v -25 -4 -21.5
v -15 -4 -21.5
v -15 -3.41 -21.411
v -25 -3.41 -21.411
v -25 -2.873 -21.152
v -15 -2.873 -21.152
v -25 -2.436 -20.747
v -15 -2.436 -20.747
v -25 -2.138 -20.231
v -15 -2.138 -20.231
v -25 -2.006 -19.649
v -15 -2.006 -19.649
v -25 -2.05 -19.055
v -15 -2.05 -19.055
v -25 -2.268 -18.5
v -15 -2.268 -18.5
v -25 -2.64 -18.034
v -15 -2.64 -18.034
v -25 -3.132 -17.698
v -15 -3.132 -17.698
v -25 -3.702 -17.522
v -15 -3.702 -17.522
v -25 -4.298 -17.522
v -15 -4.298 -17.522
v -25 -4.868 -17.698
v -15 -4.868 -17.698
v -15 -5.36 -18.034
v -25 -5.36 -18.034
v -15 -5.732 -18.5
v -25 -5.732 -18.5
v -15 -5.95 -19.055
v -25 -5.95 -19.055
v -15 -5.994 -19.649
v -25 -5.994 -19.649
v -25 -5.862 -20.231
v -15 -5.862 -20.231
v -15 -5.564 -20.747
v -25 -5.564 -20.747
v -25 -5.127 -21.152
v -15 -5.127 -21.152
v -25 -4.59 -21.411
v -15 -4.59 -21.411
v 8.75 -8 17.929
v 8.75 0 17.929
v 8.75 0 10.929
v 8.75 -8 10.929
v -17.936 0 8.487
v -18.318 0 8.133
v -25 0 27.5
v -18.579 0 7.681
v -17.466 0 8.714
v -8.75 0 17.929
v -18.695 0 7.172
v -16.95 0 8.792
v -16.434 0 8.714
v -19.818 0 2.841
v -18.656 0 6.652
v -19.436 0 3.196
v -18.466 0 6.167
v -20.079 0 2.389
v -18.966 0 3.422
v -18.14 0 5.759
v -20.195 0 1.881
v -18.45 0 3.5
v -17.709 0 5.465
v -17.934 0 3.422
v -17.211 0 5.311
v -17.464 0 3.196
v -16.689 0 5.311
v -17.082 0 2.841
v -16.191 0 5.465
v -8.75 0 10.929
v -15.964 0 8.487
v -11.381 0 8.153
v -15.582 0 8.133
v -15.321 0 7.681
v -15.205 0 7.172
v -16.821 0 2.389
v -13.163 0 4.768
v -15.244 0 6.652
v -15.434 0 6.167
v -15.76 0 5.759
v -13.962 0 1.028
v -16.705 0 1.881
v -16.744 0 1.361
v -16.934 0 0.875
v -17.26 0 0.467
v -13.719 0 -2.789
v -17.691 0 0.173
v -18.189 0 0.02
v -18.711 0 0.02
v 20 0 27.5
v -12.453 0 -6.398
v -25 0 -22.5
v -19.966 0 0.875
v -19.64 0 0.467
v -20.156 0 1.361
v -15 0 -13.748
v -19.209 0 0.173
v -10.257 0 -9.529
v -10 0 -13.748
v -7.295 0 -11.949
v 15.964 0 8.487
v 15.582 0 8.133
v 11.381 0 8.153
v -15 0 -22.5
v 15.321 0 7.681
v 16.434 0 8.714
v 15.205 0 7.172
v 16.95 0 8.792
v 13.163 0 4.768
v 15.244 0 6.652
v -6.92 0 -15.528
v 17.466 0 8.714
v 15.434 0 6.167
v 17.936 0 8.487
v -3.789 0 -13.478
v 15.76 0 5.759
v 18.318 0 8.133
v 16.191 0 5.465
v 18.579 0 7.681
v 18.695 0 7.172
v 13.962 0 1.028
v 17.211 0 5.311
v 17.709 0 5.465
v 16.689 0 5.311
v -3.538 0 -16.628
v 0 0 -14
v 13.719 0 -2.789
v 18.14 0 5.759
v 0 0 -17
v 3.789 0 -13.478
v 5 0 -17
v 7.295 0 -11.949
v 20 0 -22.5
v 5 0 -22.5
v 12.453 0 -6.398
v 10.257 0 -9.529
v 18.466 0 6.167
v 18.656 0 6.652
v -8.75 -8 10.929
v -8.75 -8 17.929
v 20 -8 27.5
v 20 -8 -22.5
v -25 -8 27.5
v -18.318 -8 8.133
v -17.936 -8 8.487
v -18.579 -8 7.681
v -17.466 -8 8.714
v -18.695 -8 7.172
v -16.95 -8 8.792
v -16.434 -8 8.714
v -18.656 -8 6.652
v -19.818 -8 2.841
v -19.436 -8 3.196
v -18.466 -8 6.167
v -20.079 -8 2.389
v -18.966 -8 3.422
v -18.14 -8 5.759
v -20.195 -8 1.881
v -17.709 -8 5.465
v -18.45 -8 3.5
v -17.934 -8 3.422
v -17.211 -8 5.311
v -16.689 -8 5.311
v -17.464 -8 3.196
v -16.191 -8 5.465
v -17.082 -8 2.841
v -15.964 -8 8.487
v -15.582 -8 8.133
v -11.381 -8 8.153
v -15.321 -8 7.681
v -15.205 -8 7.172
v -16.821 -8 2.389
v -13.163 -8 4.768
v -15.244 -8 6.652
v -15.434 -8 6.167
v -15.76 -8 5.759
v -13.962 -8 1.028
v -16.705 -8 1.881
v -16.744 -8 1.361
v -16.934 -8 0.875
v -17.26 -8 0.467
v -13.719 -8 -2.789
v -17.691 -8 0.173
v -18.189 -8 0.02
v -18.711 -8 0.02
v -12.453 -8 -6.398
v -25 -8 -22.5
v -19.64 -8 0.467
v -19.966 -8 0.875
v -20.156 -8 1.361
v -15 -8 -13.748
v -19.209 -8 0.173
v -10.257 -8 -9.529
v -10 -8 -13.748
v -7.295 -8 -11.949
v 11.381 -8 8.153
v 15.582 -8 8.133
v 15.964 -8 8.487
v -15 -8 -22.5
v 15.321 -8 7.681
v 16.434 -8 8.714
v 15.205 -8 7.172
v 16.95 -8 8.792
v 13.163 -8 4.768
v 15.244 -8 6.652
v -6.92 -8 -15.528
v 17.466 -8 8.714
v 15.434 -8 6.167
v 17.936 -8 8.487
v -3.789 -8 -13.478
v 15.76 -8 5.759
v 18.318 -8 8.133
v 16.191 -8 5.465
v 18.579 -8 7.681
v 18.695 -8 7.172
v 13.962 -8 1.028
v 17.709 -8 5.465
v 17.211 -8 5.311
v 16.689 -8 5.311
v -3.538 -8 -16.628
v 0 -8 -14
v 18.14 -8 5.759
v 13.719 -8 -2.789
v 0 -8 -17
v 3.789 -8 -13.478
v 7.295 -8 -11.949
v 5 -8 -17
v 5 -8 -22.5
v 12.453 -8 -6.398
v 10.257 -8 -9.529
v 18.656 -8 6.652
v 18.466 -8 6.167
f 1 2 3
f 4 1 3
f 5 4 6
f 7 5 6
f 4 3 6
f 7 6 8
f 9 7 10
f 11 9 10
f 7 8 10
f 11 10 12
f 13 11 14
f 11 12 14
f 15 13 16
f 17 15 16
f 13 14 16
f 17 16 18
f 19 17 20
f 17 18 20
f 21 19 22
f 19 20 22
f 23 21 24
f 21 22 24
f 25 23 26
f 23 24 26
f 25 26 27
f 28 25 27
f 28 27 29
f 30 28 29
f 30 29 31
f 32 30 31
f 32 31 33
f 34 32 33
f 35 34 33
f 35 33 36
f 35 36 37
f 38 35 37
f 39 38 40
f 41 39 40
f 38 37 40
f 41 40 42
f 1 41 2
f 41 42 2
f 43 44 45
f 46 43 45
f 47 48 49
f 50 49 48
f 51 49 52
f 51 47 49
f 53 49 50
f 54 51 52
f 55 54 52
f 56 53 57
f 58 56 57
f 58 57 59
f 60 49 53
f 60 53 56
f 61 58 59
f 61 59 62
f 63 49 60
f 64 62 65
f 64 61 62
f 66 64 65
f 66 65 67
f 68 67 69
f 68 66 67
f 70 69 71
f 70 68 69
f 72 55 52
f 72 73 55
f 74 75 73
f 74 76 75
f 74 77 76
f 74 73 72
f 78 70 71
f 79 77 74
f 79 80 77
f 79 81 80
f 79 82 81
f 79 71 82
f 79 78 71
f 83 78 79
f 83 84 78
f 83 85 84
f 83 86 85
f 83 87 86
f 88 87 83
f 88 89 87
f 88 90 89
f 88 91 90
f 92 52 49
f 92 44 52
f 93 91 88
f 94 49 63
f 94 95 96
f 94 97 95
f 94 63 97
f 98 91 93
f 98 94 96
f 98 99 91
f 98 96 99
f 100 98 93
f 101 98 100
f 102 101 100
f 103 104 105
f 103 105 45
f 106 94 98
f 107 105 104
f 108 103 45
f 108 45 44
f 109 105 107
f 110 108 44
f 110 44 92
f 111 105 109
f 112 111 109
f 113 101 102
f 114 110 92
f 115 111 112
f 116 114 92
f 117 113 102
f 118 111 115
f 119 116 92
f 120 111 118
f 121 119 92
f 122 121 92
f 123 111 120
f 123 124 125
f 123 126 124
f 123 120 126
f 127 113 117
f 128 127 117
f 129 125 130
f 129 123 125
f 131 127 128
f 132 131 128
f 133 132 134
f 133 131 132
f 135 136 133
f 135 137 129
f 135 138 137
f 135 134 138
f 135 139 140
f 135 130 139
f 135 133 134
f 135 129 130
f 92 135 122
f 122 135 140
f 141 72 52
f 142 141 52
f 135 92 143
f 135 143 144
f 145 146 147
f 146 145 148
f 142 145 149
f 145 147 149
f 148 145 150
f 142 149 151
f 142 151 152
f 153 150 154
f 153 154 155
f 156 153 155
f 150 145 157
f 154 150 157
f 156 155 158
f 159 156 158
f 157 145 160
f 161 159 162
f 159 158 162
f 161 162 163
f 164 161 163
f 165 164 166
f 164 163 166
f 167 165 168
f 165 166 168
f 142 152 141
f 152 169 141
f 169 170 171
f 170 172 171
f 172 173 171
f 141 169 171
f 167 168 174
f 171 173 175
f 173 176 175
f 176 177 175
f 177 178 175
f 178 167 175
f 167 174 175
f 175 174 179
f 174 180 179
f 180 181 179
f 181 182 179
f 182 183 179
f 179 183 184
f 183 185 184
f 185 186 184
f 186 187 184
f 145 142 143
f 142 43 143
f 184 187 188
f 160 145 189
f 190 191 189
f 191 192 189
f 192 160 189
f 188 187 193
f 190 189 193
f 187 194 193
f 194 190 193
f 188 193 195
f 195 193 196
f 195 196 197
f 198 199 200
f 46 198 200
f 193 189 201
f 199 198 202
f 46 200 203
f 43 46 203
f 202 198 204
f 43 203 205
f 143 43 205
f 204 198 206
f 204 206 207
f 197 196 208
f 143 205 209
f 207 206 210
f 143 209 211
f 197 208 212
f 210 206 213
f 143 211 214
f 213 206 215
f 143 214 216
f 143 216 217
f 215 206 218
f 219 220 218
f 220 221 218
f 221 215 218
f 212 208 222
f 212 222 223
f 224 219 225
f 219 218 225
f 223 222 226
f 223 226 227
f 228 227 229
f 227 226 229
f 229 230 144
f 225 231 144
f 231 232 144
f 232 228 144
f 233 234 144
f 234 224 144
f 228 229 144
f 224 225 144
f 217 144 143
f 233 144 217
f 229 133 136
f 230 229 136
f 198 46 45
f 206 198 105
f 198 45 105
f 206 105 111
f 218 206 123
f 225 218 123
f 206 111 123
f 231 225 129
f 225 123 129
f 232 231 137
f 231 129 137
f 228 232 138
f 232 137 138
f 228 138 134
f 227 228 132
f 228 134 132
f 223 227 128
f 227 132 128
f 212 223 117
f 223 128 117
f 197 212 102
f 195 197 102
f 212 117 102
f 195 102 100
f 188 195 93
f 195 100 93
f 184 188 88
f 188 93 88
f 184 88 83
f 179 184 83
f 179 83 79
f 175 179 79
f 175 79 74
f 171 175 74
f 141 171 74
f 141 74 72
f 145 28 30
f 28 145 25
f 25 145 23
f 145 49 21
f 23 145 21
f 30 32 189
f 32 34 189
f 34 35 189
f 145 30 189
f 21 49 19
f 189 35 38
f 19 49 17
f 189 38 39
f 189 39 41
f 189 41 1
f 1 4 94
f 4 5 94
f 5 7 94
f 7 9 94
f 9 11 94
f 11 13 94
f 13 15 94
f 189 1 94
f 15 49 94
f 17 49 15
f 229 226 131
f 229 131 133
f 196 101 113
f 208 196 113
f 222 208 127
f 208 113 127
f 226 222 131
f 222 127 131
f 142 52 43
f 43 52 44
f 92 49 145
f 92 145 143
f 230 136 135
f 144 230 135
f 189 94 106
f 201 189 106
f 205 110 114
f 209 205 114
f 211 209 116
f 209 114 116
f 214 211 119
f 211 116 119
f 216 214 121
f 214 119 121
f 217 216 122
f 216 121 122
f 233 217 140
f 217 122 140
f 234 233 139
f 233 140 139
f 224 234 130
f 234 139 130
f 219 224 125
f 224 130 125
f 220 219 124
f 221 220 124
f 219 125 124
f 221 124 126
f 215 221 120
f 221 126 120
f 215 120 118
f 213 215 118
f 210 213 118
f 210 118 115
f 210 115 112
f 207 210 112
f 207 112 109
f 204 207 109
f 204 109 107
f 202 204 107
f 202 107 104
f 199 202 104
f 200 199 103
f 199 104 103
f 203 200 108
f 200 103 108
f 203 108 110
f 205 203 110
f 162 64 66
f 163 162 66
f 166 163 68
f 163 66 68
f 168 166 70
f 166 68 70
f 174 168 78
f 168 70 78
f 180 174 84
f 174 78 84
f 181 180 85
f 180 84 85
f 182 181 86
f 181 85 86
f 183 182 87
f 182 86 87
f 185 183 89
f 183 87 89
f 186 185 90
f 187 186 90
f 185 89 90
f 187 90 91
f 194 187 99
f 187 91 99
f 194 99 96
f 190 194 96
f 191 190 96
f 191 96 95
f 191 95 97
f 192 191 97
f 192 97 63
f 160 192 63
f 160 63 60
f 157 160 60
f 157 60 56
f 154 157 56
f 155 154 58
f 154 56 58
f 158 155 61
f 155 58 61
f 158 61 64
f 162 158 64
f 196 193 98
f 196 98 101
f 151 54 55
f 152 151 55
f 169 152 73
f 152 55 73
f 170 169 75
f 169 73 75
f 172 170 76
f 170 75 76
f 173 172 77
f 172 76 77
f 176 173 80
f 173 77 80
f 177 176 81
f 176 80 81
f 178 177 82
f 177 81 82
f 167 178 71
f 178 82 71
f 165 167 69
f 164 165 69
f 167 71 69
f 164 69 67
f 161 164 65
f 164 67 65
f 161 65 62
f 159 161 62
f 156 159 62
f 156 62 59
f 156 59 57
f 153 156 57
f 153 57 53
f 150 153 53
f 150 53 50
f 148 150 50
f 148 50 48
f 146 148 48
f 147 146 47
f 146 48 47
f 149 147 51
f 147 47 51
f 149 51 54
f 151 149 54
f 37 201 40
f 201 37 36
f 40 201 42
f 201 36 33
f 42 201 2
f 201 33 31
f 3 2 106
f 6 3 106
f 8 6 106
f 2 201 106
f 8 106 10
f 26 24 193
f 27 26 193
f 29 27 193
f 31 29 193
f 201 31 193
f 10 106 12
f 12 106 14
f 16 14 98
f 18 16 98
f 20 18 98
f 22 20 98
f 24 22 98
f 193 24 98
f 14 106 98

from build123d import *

# Parameters (mm, degrees)
SKETCH2_W                                 = 45
SKETCH2_H                                 = 50
STEPPER_SLIDER_BOSS_EXTRUDE1_DEPTH        = 8
SKETCH1_R                                 = 1.75
STEPPER_HOLE_CUT_EXTRUDE1_DEPTH           = 8
ADJUSTING_SCREW_POCKET_CUT_EXTRUDE1_DEPTH = 8
SKETCH4_R                                 = 2
ADJUSTING_SCREW_HOLE_CUT_EXTRUDE2_DEPTH   = 10


with BuildPart() as part:
    # Sketch2 → Stepper Slider Boss-Extrude1 (new body)
    with BuildSketch(Plane(origin=(0, 0, 0), x_dir=(1, 0, 0), z_dir=(0, 1, 0))):
        with Locations((-2.5, -2.5)):
            Rectangle(SKETCH2_W, SKETCH2_H)
    extrude(amount=-STEPPER_SLIDER_BOSS_EXTRUDE1_DEPTH)

    # Sketch1 → Stepper Hole Cut-Extrude1 (cut)
    with BuildSketch(Plane(origin=(0, 0, 0), x_dir=(1, 0, 0), z_dir=(0, 1, 0))):
        with Locations(Location((-18.45, -1.75, 0), (0, 0, 270))):
            Circle(SKETCH1_R)
        with Locations(Location((16.95, -7.041502622, 0), (0, 0, 270))):
            Circle(SKETCH1_R)
        with Locations(Location((-16.95, -7.041502622, 0), (0, 0, 270))):
            Circle(SKETCH1_R)
        with BuildLine():
            Line((8.75, -17.928746497), (8.75, -10.928746497))
            ThreePointArc((8.75, -10.928746497), (0, 14), (-8.75, -10.928746497))
            Line((-8.75, -10.928746497), (-8.75, -17.928746497))
            Line((-8.75, -17.928746497), (8.75, -17.928746497))
        make_face()
    extrude(amount=-STEPPER_HOLE_CUT_EXTRUDE1_DEPTH, mode=Mode.SUBTRACT)

    # Sketch3 → Adjusting Screw Pocket Cut-Extrude1 (cut)
    with BuildSketch(Plane(origin=(0, 0, 0), x_dir=(1, 0, 0), z_dir=(0, 1, 0))):
        with BuildLine():
            Line((0, 22.5), (-15, 22.5))
            Line((-15, 22.5), (-15, 13.747727085))
            Line((-15, 13.747727085), (-10, 13.747727085))
            ThreePointArc((-10, 13.747727085), (-5.257786585, 16.1664987), (0, 17))
            Line((0, 17), (5, 17))
            Line((5, 17), (5, 22.5))
            Line((5, 22.5), (0, 22.5))
        make_face()
    extrude(amount=-ADJUSTING_SCREW_POCKET_CUT_EXTRUDE1_DEPTH, mode=Mode.SUBTRACT)

    # Sketch4 → Adjusting Screw Hole Cut-Extrude2 (cut)
    with BuildSketch(Plane(origin=(-15, 0, 0), x_dir=(0, 0, -1), z_dir=(1, 0, 0))):
        with Locations((19.5, -4)):
            Circle(SKETCH4_R)
    extrude(amount=-ADJUSTING_SCREW_HOLE_CUT_EXTRUDE2_DEPTH, mode=Mode.SUBTRACT)


solid = part.part
